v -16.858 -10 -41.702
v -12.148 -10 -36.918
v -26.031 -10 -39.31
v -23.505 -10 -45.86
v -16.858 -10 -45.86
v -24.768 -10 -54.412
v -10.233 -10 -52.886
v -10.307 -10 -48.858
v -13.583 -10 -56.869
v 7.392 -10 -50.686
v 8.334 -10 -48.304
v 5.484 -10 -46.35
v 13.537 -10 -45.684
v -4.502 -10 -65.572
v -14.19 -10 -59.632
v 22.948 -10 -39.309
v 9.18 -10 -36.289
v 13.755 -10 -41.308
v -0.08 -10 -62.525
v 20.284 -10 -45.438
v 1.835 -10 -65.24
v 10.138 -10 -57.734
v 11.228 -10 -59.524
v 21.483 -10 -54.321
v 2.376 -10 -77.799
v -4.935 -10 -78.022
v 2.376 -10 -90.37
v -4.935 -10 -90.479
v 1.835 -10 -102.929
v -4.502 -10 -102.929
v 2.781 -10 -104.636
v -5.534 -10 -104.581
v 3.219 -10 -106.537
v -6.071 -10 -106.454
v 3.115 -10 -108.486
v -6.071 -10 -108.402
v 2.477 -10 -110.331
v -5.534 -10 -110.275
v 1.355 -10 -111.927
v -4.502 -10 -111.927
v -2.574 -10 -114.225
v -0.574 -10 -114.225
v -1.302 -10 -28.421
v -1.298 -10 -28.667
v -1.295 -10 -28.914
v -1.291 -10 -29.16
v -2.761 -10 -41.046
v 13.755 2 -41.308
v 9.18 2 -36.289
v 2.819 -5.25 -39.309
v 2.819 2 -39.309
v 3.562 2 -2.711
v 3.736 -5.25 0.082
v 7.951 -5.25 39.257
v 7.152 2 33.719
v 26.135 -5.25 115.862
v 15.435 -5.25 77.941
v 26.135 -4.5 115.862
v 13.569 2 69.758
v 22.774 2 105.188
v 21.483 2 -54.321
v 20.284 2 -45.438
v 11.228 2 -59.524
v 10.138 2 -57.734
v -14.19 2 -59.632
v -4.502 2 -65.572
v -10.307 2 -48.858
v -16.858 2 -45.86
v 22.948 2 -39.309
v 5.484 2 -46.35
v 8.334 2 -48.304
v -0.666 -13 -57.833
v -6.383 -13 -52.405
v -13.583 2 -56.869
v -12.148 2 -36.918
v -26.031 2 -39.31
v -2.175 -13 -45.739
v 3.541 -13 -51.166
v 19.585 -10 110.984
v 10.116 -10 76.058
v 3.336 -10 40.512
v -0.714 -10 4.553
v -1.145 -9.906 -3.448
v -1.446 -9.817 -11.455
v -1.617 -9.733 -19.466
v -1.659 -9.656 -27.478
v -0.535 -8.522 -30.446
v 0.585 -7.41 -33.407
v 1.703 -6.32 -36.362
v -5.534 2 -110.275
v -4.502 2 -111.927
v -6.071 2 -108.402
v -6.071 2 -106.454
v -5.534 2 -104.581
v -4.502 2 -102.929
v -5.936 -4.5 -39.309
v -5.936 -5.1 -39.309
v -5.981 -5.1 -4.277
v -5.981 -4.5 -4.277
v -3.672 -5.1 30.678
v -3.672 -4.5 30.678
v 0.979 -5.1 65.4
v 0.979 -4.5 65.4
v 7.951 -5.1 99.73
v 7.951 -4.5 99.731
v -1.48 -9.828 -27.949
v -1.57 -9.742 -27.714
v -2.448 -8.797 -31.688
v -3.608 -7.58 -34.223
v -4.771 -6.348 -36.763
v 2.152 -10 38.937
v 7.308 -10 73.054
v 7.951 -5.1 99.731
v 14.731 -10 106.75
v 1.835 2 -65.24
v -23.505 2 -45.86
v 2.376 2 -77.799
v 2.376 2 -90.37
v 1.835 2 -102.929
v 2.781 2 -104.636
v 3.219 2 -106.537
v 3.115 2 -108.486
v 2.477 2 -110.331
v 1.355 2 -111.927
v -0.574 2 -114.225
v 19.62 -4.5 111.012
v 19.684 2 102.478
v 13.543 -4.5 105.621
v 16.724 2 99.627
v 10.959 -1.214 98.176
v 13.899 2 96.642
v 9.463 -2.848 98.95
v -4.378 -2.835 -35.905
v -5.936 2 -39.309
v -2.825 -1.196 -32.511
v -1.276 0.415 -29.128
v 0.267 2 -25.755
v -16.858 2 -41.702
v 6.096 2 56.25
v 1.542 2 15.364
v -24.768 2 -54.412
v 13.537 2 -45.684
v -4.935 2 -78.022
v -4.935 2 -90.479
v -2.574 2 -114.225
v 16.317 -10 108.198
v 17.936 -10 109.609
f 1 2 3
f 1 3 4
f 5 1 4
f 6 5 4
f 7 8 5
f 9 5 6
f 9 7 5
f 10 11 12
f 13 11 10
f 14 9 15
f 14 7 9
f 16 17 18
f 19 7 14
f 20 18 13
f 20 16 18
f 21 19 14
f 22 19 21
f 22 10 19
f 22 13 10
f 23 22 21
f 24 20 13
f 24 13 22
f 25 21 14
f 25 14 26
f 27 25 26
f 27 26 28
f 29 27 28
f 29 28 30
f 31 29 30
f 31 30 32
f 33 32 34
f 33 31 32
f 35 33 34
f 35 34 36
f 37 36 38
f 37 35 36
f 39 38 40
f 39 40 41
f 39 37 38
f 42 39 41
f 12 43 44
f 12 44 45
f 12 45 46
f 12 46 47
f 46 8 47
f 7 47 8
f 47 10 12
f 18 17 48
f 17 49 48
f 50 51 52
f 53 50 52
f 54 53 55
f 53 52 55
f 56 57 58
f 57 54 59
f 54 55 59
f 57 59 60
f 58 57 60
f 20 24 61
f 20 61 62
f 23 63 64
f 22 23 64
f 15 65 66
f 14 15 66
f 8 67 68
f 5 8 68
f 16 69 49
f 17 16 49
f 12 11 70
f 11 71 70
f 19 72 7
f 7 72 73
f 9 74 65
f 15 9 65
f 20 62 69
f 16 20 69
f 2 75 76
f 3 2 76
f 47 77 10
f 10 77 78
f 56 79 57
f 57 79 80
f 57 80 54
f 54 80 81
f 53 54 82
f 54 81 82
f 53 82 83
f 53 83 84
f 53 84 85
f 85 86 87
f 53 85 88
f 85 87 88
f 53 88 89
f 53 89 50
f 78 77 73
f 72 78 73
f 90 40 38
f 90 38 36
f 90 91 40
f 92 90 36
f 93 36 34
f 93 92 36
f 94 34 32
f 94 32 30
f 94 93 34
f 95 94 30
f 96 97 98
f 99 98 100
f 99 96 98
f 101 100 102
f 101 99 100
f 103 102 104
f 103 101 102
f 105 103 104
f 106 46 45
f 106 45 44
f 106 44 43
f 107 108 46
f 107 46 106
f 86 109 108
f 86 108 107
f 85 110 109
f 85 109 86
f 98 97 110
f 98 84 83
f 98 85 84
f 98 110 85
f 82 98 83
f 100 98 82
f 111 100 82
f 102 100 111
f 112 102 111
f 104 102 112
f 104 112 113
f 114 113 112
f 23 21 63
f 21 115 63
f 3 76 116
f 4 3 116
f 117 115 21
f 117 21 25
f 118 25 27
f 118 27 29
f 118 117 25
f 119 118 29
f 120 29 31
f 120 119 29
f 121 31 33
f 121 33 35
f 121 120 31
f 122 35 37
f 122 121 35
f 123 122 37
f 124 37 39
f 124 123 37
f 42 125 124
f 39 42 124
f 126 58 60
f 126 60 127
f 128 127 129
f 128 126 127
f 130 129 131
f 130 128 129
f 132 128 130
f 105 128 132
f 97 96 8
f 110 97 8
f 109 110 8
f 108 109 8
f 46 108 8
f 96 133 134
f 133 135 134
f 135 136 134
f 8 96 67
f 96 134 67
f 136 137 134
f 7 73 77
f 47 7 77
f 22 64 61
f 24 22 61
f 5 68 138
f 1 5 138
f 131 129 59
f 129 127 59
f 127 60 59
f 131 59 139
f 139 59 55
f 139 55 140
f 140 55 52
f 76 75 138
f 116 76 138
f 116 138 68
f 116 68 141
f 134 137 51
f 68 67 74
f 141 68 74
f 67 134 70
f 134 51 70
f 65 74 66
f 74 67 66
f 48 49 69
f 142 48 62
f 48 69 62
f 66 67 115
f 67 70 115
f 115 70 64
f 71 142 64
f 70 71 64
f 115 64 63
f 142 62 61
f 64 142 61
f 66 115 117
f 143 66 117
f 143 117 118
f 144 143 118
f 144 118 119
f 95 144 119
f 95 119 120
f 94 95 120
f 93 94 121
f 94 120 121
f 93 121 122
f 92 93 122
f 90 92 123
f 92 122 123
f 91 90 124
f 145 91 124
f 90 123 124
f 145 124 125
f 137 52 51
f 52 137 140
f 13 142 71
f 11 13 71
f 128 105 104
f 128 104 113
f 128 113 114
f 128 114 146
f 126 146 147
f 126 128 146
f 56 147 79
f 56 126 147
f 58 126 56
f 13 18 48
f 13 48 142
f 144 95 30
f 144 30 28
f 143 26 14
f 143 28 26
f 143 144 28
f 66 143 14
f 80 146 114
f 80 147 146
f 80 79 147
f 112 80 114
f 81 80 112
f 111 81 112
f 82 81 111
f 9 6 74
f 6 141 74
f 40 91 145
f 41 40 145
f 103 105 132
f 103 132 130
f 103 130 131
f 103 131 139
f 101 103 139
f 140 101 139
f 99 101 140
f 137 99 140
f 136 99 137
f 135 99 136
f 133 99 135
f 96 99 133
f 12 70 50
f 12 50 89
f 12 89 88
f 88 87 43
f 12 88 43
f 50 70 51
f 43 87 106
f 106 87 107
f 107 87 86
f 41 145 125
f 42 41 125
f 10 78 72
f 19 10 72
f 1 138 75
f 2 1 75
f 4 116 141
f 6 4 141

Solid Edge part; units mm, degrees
sketch "Sketch1" plane through (0, 0, 0) normal (0, -1, 0) x (1, 0, 0)
  arc A0 (-4.5017, -65.5722) -> (-4.5017, -102.9287) centre (353.0441, -84.2504) ccw
  arc A1 (-4.5017, -111.927) -> (-4.5017, -102.9287) centre (0.8609, -107.4279) cw
  line L0 (-4.5017, -111.927) -> (-2.5735, -114.2253)
  line L1 (-2.5735, -114.2253) -> (-0.5735, -114.2253)
  line L2 (-0.5735, -114.2253) -> (1.3547, -111.927)
  arc A2 (1.8354, -102.9287) -> (1.3547, -111.927) centre (-3.7546, -107.1421) cw
  arc A3 (1.8354, -65.24) -> (1.8354, -102.9287) centre (-289.5994, -84.0844) cw
  line L3 (1.8354, -65.24) -> (11.2279, -59.5245)
  line L4 (11.2279, -59.5245) -> (10.138, -57.7335)
  line L5 (10.138, -57.7335) -> (21.4828, -54.3207)
  line L6 (21.4828, -54.3207) -> (20.2837, -45.4381)
  line L7 (20.2837, -45.4381) -> (22.9485, -39.309)
  line L8 (22.9485, -39.309) -> (9.1804, -36.2889)
  line L9 (9.1804, -36.2889) -> (13.7549, -41.3076)
  line L10 (13.7549, -41.3076) -> (13.5371, -45.6842)
  line L11 (13.5371, -45.6842) -> (8.3343, -48.3038)
  line L12 (8.3343, -48.3038) -> (5.4838, -46.3497)
  line L13 (5.4838, -46.3497) -> (2.819, -39.309)
  arc A4 (26.1353, 115.8621) -> (2.819, -39.309) centre (472.3821, -30.529) ccw
  arc A5 (7.9508, 99.7305) -> (26.1353, 115.8621) centre (79.4185, 37.4829) cw
  arc A6 (-5.9365, -39.309) -> (7.9508, 99.7305) centre (515.0772, -21.1345) cw
  line L14 (-5.9365, -39.309) -> (-10.3074, -48.8582)
  line L15 (-10.3074, -48.8582) -> (-16.8579, -45.8598)
  line L16 (-16.8579, -45.8598) -> (-16.8579, -41.7022)
  line L17 (-16.8579, -41.7022) -> (-12.1485, -36.918)
  line L18 (-12.1485, -36.918) -> (-26.0312, -39.3101)
  line L19 (-26.0312, -39.3101) -> (-23.5049, -45.8598)
  line L20 (-23.5049, -45.8598) -> (-24.7681, -54.4115)
  line L21 (-24.7681, -54.4115) -> (-13.5826, -56.869)
  line L22 (-13.5826, -56.869) -> (-14.1898, -59.6323)
  line L23 (-14.1898, -59.6323) -> (-4.5017, -65.5722)
extrude "Kihúzás_1" add sketch "Sketch1" along normal blind 10 and the other way blind 2
sketch "Sketch2" plane through (0.0521, -10, 0.8184) normal (0, -1, 0) x (0.8525228, 0, -0.52269)
  line L0 (19.4839, -37.1611) -> (19.3022, -51.1599)
  line L1 (19.3022, -51.1599) -> (32.9962, -54.0711)
  line L2 (32.9962, -54.0711) -> (33.1779, -40.0723)
  line L3 (33.1779, -40.0723) -> (19.4839, -37.1611)
  dimension "D1" = 14
  dimension "D2" = 14
  dimension "D3" = 14
  dimension "D4" = 14
extrude "Kihúzás_2" add sketch "Sketch2" along normal blind 3
chamfer "Letörés_2" distance 3 angle 45 4 edges at (-6.4972, -13, -46.966) (2.3152, -13, -45.8661) (3.6556, -13, -56.6055) (-5.1567, -13, -57.7054)
chamfer "Letörés_4" distance 4.75 angle 45 1 edges at (7.9508, -10, 39.2572)
chamfer "Letörés_6" distance 4.9 angle 45 1 edges at (-3.6723, -10, 30.6781)
chamfer "Letörés_9" distance 6.5 angle 45 2 edges at (-3.6723, 2, 30.6781) (16.5237, 2, 108.3818)
